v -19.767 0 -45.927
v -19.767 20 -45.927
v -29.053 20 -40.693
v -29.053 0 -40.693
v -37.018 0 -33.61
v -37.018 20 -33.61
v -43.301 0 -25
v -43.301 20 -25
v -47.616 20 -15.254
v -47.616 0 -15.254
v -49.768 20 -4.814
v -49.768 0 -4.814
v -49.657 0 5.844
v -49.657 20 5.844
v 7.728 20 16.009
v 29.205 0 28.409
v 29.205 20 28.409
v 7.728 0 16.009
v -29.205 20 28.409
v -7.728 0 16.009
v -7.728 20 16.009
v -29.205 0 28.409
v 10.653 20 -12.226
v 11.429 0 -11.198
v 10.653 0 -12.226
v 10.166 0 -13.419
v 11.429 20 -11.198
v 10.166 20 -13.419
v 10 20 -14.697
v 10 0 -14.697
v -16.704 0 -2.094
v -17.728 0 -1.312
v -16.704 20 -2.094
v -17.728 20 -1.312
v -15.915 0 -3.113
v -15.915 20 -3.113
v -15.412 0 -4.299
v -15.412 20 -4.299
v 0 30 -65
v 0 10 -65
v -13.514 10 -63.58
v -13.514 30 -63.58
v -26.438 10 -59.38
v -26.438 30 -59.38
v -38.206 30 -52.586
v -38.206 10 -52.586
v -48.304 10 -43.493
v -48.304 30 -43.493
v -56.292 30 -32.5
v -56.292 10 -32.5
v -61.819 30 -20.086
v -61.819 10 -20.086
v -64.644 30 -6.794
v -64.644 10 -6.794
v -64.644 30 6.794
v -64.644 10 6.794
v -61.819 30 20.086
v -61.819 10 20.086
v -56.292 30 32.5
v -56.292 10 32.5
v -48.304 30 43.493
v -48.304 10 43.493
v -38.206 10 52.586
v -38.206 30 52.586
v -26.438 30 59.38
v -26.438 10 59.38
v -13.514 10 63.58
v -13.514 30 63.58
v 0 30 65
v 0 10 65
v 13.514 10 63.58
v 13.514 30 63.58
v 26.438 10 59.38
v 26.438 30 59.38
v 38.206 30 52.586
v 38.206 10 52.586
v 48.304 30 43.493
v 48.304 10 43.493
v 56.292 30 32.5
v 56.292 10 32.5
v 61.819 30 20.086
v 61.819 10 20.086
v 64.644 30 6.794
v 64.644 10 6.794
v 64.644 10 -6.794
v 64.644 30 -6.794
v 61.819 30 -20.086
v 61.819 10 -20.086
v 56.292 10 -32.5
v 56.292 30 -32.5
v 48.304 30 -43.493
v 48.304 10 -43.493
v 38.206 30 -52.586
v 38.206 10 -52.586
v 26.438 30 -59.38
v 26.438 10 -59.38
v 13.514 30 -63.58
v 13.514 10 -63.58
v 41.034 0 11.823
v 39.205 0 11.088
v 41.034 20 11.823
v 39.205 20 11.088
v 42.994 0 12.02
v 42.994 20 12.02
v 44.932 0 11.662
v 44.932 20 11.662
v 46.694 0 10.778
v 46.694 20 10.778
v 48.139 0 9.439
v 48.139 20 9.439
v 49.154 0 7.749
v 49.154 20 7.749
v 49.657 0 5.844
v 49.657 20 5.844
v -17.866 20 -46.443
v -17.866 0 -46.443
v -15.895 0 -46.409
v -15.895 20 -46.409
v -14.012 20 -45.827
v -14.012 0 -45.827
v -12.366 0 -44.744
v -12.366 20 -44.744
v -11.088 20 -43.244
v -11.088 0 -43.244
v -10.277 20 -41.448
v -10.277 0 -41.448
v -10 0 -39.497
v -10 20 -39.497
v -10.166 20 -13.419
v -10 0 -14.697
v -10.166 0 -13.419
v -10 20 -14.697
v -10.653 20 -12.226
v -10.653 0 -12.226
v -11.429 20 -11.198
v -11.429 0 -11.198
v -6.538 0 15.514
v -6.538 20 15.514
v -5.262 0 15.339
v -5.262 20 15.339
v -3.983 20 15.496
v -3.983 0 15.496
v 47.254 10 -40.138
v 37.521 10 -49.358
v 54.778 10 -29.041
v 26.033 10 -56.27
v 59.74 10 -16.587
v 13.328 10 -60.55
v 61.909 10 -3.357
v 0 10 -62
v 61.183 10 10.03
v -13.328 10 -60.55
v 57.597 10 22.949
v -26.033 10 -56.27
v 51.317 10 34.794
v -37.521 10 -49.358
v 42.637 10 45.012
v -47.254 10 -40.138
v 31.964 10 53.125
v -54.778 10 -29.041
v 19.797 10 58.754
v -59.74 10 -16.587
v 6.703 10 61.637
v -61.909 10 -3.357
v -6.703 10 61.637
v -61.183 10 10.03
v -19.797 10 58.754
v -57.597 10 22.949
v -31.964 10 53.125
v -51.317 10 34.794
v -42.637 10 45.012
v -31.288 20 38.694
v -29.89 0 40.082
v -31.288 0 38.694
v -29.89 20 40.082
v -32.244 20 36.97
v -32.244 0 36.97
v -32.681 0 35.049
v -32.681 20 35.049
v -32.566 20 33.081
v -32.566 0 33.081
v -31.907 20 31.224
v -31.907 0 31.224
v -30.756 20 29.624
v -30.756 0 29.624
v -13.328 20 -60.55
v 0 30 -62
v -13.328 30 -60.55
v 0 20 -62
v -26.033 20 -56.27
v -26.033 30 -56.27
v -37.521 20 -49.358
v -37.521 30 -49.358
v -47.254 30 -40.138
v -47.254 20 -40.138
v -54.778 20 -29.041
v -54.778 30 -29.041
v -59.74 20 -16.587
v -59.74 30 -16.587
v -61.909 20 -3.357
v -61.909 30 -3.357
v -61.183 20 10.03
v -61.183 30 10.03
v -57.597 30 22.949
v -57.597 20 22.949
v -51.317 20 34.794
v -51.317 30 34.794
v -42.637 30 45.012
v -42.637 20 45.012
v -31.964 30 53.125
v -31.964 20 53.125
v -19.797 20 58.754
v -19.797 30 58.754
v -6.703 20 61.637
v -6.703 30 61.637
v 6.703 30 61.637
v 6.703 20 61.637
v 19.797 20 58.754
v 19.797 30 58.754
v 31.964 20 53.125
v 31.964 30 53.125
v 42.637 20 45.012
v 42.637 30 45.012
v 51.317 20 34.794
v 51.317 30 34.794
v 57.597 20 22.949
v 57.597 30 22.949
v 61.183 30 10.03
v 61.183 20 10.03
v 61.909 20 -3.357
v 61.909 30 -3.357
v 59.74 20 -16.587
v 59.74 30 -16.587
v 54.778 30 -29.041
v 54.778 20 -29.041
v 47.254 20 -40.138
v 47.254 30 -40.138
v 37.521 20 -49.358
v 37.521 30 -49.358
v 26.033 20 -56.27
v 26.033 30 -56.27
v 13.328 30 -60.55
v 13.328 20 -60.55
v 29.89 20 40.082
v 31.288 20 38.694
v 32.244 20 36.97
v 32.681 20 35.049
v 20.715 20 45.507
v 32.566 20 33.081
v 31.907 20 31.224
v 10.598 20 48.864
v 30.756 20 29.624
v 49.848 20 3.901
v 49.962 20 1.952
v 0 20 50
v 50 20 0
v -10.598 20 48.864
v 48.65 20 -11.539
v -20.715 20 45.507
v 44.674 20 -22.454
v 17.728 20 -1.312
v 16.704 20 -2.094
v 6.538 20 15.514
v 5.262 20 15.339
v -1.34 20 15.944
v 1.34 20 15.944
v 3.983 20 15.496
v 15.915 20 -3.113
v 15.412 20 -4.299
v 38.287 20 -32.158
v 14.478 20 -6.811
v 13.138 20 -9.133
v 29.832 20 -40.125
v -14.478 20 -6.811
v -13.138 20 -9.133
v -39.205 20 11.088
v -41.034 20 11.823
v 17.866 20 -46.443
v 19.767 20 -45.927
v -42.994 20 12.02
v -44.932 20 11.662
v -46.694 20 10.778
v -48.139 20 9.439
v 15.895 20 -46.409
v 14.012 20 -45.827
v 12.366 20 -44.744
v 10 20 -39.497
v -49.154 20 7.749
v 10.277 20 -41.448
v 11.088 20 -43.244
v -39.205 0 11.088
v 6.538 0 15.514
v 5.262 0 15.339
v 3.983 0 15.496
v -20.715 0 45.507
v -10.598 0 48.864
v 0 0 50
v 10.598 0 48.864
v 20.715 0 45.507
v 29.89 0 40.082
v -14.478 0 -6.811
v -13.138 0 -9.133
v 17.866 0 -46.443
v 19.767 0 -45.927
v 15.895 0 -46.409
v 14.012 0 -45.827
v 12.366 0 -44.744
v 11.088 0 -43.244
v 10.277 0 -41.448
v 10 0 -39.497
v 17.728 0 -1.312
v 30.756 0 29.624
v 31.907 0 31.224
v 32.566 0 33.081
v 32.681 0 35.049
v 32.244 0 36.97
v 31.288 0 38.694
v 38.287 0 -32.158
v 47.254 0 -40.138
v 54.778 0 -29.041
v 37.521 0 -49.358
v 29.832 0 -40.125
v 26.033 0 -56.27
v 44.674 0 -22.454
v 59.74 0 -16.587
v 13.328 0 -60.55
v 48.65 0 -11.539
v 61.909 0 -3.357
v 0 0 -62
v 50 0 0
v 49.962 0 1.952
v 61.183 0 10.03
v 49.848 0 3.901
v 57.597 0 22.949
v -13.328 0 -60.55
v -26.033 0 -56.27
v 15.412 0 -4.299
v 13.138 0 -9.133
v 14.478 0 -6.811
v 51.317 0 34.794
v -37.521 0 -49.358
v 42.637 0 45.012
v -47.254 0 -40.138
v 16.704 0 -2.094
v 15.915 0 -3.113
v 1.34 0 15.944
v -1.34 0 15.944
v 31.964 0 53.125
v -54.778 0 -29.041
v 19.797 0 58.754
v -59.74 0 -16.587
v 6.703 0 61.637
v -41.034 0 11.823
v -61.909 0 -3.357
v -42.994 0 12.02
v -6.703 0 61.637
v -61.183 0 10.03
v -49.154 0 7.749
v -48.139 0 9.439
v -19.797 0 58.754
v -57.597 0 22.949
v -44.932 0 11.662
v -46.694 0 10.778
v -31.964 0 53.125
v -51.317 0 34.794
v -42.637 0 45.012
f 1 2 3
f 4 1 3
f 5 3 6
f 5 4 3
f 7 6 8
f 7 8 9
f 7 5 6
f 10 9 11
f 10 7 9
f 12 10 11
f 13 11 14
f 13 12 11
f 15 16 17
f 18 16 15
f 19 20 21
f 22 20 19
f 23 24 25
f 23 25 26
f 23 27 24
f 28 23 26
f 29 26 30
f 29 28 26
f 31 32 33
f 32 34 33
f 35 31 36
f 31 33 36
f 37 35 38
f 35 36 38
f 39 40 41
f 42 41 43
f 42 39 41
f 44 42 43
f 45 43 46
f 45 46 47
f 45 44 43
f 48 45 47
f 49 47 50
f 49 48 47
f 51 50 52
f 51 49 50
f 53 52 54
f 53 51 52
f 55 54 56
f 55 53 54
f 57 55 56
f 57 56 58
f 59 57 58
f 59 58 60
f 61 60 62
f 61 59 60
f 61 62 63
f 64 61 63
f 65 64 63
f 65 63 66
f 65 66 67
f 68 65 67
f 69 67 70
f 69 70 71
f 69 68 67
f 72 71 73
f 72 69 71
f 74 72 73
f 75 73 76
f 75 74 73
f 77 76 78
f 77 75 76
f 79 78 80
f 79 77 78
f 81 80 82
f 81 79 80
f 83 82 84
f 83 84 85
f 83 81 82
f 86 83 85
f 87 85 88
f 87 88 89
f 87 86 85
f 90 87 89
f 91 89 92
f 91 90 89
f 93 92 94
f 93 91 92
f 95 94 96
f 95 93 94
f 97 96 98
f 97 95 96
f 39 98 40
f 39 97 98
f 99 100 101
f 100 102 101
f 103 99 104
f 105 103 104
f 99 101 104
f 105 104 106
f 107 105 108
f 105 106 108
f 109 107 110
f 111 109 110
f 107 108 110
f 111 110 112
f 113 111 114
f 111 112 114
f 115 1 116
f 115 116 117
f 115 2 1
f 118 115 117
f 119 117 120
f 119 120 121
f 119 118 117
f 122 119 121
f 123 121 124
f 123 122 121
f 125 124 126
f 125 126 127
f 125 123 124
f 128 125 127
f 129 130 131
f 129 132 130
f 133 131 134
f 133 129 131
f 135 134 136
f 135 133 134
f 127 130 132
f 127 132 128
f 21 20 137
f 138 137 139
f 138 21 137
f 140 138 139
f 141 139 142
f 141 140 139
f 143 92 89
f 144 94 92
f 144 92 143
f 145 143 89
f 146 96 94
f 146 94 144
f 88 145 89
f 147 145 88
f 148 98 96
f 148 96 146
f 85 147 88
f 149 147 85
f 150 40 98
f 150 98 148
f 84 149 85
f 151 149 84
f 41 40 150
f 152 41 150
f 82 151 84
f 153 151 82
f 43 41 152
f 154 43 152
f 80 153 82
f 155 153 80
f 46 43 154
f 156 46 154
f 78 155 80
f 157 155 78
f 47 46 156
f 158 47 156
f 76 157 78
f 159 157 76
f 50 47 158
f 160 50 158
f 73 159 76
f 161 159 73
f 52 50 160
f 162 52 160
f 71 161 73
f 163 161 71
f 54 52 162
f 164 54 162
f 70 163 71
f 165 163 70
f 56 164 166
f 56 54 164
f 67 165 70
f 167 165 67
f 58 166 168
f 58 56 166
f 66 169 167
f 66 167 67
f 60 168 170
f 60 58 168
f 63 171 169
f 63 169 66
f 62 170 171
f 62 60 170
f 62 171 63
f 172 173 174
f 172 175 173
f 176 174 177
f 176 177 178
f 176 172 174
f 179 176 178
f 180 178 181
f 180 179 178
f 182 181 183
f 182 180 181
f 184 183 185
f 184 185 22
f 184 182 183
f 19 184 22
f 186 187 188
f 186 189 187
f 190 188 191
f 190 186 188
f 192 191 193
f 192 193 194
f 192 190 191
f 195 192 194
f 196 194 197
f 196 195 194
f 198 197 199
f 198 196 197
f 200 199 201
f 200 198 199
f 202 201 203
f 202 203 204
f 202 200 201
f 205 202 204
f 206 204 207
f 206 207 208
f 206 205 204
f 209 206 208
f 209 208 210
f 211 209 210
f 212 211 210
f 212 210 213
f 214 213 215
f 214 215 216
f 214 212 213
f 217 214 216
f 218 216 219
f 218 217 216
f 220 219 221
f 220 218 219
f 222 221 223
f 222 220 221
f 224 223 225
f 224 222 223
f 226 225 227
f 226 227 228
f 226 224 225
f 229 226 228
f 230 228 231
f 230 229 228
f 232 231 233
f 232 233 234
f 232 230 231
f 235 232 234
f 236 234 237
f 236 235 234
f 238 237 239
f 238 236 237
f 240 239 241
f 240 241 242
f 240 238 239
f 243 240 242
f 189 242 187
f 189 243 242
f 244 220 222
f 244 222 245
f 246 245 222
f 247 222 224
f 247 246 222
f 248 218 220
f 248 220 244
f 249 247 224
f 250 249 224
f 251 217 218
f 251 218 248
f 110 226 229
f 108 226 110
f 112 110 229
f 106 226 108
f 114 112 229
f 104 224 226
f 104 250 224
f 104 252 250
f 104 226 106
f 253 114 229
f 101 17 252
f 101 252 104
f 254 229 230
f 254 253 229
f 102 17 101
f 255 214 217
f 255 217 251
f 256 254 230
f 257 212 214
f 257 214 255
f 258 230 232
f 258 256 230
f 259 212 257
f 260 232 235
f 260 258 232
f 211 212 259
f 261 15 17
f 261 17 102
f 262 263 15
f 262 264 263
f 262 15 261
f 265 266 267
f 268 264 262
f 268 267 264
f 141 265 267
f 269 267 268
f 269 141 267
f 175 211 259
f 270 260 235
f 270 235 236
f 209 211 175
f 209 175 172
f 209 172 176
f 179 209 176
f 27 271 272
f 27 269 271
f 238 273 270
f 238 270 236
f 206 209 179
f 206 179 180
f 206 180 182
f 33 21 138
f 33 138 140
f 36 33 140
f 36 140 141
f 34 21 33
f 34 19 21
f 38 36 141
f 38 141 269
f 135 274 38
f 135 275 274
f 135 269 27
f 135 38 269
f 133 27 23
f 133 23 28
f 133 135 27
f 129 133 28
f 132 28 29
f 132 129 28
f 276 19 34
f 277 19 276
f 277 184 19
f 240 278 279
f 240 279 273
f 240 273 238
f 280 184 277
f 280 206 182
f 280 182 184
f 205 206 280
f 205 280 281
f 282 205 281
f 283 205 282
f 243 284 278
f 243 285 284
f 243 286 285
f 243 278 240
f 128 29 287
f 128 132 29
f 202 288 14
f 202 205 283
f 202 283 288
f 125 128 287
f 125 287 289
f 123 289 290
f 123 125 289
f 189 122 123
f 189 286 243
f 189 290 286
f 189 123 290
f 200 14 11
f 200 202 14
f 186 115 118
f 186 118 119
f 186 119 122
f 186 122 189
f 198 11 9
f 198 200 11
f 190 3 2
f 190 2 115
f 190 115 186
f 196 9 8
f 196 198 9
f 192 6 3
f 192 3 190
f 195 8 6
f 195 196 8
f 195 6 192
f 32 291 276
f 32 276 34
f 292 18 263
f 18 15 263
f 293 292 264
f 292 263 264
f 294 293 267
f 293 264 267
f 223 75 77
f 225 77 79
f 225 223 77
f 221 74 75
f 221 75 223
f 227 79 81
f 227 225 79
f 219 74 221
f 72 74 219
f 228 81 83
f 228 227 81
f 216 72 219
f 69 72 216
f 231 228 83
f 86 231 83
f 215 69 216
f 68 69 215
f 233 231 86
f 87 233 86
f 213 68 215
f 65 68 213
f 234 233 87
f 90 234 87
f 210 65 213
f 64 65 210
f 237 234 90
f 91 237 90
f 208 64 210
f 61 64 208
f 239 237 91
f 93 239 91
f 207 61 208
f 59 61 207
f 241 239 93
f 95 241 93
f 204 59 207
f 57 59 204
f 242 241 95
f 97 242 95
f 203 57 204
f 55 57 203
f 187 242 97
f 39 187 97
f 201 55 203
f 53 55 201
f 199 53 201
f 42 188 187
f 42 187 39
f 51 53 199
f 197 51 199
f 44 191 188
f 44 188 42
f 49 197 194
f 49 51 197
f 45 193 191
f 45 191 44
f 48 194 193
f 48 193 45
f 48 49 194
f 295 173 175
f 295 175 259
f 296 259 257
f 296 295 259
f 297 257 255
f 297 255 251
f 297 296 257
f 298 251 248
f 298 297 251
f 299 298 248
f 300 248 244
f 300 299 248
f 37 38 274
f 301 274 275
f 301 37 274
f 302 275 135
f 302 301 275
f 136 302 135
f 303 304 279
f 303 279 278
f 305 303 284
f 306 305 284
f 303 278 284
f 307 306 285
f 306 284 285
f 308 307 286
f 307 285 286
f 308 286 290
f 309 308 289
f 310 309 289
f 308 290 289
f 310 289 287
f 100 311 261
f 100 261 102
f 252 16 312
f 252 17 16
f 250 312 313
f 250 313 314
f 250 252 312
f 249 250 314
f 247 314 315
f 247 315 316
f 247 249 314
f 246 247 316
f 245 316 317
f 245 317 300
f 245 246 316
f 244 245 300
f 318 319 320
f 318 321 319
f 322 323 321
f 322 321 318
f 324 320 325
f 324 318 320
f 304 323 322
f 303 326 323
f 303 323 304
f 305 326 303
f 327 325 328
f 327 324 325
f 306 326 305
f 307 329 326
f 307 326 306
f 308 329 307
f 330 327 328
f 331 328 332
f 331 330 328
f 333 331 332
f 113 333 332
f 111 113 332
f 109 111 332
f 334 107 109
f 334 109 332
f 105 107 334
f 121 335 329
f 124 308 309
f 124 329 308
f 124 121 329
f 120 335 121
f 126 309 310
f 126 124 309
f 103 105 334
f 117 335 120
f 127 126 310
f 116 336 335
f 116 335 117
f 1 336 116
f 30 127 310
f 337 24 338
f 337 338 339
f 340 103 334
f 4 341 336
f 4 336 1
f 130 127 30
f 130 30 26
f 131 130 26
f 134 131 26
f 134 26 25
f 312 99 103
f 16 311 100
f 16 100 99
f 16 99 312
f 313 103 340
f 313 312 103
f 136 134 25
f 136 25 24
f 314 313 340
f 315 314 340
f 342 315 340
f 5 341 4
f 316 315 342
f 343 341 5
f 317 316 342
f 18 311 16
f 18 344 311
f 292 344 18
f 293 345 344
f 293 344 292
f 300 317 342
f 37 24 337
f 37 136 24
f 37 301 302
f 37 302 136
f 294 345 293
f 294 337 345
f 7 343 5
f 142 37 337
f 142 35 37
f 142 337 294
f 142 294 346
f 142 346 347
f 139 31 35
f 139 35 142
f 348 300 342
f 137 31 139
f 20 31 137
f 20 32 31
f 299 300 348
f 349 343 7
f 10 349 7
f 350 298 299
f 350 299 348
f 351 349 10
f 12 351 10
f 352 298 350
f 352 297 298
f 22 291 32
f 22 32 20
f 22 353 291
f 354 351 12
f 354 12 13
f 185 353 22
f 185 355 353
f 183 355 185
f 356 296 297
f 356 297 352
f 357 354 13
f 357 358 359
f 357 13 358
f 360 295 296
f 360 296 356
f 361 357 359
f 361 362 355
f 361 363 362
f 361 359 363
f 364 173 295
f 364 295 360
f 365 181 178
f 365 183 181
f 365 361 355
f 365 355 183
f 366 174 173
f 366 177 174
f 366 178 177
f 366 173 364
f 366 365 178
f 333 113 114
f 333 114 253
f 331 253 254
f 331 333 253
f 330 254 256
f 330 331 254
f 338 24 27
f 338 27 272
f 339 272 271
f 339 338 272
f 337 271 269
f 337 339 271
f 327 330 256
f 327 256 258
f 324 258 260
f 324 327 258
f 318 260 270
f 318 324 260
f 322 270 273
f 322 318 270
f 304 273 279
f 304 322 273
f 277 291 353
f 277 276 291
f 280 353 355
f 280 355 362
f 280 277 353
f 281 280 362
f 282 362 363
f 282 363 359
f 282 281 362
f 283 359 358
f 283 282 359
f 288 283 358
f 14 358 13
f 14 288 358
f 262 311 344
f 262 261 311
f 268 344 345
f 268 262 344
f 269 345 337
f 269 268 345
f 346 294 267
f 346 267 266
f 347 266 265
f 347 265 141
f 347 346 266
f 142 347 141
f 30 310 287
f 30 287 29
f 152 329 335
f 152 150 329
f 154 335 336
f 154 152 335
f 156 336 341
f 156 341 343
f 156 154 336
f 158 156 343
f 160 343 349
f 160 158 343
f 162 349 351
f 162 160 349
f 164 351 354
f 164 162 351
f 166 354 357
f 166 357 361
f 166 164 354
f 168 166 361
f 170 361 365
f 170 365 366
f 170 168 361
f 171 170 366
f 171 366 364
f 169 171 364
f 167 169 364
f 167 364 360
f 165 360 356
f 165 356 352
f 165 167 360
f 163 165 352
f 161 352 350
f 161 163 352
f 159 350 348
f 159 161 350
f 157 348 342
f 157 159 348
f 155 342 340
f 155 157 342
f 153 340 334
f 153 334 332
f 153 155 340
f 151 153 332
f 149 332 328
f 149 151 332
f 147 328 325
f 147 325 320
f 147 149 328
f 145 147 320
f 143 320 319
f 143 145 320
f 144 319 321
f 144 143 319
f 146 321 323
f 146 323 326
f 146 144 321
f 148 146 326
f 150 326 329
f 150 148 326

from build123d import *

# Parameters (mm, degrees)
CUT_EXTRUDE1_DEPTH = 20
FILLET1_R          = 5
FILLET2_R          = 7


with BuildPart() as part:
    # Sketch1 → Revolve1 (revolve)
    with BuildSketch(Plane.XY, mode=Mode.PRIVATE) as revolve1_sk:
        Polygon((0, 0), (-62, 0), (-62, 10), (-65, 10), (-65, 30), (-62, 30), (-62, 20), (0, 20), align=None)
    revolve(revolve1_sk.sketch.rotate(Axis((0, 0, 0), (0, 1, 0)), 270), axis=Axis((0, 0, 0), (0, 1, 0)))

    # Szkic1 → Cut-Extrude1 (cut)
    with BuildSketch(Plane(origin=(0, 0, 0), x_dir=(1, 0, 0), z_dir=(0, 1, 0))):
        with BuildLine():
            ThreePointArc((-15.816653826, 2.415256039), (-13.856406461, 8), (-10, 12.489995997))
            Line((-10, 12.489995997), (-10, 48.989794856))
            ThreePointArc((-10, 48.989794856), (-43.301270189, 25), (-47.426406871, -15.83464339))
            Line((-47.426406871, -15.83464339), (-15.816653826, 2.415256039))
        make_face()
        with BuildLine():
            Line((10, 48.989794856), (10, 12.489995997))
            ThreePointArc((10, 12.489995997), (13.856406461, 8), (15.816653826, 2.415256039))
            Line((15.816653826, 2.415256039), (47.426406871, -15.83464339))
            ThreePointArc((47.426406871, -15.83464339), (49.352407963, -8.021211144), (50, 0))
            ThreePointArc((50, 0), (38.729833462, 31.622776602), (10, 48.989794856))
        make_face()
        with BuildLine():
            ThreePointArc((5.816653826, -14.905252036), (0, -16), (-5.816653826, -14.905252036))
            Line((-5.816653826, -14.905252036), (-37.426406871, -33.155151466))
            ThreePointArc((-37.426406871, -33.155151466), (0, -50), (37.426406871, -33.155151466))
            Line((37.426406871, -33.155151466), (5.816653826, -14.905252036))
        make_face()
    extrude(amount=CUT_EXTRUDE1_DEPTH, mode=Mode.SUBTRACT)

    # Fillet1
    fillet1_edges = [part.edges().sort_by_distance(p)[0] for p in [
        (10, 10, -12.489995997),
        (15.816653826, 10, -2.415256039),
        (5.816653826, 10, 14.905252036),
        (-5.816653826, 10, 14.905252036),
        (-15.816653826, 10, -2.415256039),
        (-10, 10, -12.489995997),
    ]]
    fillet(fillet1_edges, radius=FILLET1_R)

    # Fillet2
    fillet2_edges = [part.edges().sort_by_distance(p)[0] for p in [
        (47.426406871, 10, 15.83464339),
        (10, 10, -48.989794856),
        (-37.426406871, 10, 33.155151466),
        (37.426406871, 10, 33.155151466),
        (-10, 10, -48.989794856),
        (-47.426406871, 10, 15.83464339),
    ]]
    fillet(fillet2_edges, radius=FILLET2_R)


solid = part.part
